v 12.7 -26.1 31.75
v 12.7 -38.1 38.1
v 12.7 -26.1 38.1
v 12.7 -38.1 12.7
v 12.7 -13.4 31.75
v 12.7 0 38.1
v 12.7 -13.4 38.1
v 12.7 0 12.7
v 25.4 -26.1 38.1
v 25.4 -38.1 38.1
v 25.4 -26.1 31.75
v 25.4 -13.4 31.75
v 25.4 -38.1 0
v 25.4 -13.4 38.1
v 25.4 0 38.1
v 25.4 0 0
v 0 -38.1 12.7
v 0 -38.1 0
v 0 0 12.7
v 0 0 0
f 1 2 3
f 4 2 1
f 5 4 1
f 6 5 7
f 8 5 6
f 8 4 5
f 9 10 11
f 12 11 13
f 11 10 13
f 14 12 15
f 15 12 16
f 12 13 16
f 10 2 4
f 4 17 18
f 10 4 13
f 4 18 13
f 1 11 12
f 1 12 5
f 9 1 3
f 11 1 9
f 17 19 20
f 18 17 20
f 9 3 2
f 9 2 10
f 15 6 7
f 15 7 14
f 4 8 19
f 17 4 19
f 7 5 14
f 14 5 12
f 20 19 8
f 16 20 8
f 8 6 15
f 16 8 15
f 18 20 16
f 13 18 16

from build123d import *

# Parameters (mm, degrees)
F1_DEPTH = 38.1
F2_W     = 12.7
F2_H     = 12.000482
F2_H_2   = 13.399518
F3_DEPTH = 6.35


with BuildPart() as f1:
    # F0 (on Front) → F1 (new body)
    with BuildSketch(Plane.XZ):
        Polygon((0, 12.7), (0, 0), (25.4, 0), (25.4, 31.75), (12.7, 31.75), (12.7, 12.7), align=None)
    extrude(amount=F1_DEPTH)

    # F2 (on face) → F3 (join)
    with BuildSketch(Plane.XY.offset(31.75)):
        with Locations((19.05, -32.099759)):
            Rectangle(F2_W, F2_H)
        with Locations((19.05, -6.699759)):
            Rectangle(F2_W, F2_H_2)
    extrude(amount=F3_DEPTH)


solid = f1.part
